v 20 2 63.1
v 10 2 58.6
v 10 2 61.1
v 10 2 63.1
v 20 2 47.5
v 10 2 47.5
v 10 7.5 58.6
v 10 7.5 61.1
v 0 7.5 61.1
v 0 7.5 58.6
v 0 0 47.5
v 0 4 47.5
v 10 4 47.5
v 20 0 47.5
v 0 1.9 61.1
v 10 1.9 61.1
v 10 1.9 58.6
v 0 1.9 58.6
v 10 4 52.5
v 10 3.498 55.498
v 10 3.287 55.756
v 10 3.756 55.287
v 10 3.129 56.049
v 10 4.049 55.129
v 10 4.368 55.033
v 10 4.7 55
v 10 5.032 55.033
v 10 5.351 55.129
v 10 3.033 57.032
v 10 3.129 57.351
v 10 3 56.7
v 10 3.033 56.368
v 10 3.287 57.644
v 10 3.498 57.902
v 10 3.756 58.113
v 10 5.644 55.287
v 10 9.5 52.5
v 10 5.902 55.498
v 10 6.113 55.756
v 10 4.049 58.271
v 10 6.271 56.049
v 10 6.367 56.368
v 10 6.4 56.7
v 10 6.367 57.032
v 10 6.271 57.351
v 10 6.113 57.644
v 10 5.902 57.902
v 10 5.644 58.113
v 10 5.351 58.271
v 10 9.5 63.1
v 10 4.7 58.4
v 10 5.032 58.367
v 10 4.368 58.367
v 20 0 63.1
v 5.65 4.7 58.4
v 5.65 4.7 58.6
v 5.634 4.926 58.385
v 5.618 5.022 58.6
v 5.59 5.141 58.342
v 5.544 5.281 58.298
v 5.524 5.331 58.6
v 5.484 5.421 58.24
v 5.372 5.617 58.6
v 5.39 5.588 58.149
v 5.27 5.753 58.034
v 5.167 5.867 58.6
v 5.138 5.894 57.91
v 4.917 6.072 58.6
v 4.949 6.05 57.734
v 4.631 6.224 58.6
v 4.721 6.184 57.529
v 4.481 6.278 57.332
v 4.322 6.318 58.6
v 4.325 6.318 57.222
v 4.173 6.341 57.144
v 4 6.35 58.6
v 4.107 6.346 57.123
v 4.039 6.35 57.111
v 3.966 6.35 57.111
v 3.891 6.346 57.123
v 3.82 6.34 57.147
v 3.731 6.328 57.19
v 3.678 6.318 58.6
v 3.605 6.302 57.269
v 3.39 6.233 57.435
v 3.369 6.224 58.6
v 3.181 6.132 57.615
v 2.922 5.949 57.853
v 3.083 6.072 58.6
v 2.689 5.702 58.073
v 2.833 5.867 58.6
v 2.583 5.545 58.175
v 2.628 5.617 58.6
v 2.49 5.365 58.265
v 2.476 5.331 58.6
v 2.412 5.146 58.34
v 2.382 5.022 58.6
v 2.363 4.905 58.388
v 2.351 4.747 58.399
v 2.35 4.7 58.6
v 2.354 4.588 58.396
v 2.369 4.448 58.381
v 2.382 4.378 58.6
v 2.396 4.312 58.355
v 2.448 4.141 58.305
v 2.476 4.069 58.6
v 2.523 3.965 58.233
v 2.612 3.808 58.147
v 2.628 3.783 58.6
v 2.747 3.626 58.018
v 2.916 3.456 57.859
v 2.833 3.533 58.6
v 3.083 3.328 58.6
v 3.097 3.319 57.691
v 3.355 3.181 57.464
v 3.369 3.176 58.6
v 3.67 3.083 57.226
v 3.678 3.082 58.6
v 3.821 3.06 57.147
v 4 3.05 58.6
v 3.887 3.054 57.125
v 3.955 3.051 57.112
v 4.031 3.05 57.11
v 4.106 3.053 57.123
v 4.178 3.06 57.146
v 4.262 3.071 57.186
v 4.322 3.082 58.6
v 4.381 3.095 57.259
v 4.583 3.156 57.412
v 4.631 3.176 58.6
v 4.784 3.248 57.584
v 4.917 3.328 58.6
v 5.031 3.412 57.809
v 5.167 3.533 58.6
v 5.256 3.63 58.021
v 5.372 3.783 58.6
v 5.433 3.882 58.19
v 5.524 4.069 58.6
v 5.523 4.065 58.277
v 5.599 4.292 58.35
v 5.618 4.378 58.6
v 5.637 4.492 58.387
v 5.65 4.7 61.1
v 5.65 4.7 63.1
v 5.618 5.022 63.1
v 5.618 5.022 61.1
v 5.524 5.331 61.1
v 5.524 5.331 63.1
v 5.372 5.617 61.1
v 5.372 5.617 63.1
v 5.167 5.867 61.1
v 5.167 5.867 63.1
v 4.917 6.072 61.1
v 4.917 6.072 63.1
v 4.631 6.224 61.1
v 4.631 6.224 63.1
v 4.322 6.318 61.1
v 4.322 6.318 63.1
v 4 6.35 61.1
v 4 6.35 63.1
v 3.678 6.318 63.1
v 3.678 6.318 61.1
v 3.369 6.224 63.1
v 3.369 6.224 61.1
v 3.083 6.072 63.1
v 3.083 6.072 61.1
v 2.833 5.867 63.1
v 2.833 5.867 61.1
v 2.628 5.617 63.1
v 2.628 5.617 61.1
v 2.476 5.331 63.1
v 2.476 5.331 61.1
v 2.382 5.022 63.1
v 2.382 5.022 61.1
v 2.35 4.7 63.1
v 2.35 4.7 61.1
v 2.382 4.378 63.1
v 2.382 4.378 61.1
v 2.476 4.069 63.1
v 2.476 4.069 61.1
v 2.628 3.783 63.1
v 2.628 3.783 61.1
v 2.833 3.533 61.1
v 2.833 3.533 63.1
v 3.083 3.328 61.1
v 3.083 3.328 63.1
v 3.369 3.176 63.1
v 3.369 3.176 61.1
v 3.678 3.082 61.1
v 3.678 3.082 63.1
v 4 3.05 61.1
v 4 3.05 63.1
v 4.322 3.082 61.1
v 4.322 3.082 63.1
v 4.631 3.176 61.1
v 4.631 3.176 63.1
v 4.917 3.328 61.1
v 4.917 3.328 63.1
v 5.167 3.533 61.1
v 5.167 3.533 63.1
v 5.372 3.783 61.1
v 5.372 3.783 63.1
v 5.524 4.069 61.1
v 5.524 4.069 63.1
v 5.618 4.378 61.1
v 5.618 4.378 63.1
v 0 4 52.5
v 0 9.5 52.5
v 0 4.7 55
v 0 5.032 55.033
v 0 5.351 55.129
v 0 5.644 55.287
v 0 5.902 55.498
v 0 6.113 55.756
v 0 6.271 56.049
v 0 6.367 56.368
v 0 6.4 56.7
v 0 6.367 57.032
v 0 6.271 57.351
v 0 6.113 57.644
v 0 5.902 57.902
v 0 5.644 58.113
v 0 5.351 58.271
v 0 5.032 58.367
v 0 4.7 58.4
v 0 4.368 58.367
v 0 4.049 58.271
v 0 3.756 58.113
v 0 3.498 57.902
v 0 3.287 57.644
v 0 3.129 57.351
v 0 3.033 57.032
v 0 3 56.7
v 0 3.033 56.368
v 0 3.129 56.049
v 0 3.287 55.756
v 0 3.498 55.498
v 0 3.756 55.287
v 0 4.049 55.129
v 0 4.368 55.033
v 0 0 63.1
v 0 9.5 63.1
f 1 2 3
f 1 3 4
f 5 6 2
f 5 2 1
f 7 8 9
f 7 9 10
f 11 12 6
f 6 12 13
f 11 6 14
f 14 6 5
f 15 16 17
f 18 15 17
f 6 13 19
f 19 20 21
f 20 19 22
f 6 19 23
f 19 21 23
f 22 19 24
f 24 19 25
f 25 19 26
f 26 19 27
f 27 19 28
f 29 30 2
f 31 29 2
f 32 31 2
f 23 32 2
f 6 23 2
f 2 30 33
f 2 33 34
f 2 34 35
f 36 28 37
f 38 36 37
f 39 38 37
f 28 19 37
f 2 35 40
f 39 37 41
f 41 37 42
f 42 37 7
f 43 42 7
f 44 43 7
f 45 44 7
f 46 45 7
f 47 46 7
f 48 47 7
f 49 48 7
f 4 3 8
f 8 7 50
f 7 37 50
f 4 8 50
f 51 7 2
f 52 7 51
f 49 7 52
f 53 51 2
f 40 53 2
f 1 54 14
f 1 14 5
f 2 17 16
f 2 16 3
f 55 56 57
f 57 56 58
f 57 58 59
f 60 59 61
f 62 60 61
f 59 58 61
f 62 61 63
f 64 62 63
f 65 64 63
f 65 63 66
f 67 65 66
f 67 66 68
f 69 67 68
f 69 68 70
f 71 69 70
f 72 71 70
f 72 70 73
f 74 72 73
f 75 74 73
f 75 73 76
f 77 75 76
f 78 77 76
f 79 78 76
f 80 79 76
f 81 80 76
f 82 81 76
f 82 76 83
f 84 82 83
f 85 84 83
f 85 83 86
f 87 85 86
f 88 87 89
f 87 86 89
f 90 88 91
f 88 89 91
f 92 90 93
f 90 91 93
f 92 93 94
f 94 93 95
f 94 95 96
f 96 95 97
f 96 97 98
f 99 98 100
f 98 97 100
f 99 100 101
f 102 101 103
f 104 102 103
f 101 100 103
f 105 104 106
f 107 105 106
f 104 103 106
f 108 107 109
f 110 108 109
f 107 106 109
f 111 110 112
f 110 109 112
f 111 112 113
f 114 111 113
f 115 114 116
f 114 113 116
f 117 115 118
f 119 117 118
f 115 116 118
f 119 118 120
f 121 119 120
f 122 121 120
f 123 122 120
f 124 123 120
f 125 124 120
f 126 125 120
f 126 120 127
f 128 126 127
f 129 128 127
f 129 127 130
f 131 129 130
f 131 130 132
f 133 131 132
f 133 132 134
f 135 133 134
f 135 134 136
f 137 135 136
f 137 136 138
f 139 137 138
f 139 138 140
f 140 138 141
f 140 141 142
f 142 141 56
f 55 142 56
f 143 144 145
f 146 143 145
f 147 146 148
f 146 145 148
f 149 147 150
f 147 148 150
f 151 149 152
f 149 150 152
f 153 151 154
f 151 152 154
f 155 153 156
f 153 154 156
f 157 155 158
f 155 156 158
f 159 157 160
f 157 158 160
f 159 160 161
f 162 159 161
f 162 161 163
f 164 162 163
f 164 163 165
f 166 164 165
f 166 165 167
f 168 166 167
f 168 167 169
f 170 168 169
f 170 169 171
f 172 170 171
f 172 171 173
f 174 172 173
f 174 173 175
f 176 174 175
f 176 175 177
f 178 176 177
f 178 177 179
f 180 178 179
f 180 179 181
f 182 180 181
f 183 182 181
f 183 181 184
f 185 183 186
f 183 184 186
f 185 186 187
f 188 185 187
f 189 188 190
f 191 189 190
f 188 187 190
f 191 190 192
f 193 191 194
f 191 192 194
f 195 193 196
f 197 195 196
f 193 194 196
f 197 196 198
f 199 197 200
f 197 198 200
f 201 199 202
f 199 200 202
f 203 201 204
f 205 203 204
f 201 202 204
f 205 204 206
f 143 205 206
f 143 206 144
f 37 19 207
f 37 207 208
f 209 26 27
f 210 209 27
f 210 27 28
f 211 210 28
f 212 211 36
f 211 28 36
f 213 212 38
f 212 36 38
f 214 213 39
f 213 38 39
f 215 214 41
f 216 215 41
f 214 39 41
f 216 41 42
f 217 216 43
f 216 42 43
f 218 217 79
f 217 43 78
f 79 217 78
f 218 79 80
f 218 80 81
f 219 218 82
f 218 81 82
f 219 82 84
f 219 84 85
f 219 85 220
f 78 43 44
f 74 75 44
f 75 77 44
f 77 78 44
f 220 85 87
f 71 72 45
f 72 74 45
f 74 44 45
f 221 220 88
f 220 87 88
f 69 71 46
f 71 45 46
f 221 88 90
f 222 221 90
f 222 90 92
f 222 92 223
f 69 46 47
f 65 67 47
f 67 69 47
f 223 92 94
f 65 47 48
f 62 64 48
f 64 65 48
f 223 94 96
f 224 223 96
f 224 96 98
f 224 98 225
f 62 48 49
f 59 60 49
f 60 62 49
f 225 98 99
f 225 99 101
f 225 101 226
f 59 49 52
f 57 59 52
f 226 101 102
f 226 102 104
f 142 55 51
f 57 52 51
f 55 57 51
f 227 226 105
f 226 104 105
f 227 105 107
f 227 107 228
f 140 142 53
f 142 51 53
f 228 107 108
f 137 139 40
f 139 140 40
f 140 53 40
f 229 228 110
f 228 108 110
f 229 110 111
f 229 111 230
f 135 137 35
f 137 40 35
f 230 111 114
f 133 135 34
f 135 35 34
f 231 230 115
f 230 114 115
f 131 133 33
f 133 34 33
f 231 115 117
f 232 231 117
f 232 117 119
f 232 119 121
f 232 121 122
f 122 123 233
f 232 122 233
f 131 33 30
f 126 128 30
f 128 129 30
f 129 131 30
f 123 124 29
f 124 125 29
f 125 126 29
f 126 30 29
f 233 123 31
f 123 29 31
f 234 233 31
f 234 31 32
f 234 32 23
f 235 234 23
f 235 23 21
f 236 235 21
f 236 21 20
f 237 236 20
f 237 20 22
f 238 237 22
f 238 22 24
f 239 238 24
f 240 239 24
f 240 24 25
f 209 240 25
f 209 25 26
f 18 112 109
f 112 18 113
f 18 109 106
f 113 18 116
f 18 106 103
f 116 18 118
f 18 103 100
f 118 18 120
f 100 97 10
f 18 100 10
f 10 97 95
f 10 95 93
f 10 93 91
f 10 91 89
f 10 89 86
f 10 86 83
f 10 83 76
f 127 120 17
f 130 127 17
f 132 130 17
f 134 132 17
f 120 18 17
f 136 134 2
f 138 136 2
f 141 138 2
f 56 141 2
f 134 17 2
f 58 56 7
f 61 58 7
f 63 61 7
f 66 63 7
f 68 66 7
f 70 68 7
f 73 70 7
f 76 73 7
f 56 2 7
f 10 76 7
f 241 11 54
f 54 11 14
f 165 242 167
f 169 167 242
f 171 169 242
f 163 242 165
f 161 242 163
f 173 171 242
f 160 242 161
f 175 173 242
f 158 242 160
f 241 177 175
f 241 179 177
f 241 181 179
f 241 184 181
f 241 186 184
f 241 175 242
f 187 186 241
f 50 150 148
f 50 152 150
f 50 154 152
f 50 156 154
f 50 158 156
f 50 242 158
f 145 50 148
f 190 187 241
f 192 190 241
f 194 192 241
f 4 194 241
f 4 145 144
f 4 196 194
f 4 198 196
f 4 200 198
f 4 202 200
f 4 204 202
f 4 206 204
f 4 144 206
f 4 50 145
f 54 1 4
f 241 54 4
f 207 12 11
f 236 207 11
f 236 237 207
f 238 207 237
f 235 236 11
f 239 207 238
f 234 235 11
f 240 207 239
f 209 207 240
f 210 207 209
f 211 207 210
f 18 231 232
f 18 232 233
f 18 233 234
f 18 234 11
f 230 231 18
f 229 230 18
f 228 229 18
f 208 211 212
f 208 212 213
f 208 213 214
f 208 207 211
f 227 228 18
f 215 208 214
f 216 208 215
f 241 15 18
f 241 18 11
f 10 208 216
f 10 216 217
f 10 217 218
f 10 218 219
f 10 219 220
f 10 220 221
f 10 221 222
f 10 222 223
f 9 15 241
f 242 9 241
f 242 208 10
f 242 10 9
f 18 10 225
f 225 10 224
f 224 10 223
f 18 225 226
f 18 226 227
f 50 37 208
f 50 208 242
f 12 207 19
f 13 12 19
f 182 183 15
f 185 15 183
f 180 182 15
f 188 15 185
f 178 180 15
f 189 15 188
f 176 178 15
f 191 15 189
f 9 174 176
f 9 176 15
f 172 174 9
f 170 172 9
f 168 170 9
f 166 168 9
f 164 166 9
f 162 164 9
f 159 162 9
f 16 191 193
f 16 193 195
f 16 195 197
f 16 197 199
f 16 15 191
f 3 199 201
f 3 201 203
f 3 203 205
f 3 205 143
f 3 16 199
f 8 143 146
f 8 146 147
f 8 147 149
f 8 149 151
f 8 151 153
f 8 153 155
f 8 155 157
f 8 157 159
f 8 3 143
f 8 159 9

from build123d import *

# Parameters (mm, degrees)
RESSALTO_EXTRUS_O1_DEPTH             = 52.5
ESBO_O3_W                            = 10
ESBO_O3_H                            = 4
RESSALTO_EXTRUS_O2_DEPTH             = 5
ESBO_O4_R                            = 1.7
ESBO_O4_W                            = 2.5
ESBO_O4_H                            = 5.6
RESSALTO_EXTRUS_O3_DEPTH             = 10
ESBO_O5_R                            = 1.65
CORTE_EXTRUS_O1_DEPTH                = 6
RESSALTO_EXTRUS_O4_REACH             = 12.6
ESBO_O6_W                            = 10
ESBO_O6_H                            = 2
RESSALTO_EXTRUS_O4_DIRECTION_2_REACH = 117.6
ESBO_O7_W                            = 20
ESBO_O7_H                            = 110.6
CORTE_EXTRUS_O2_DEPTH                = 6.5
CORTE_EXTRUS_O2_DEPTH_BACK           = 5


with BuildPart() as part:
    # Esboço1 → Ressalto-extrusão1 (new body, symmetric)
    with BuildSketch(Plane.XY):
        Polygon((0, 0), (0, 2), (5, 2), (5, 4), (10, 4), (10, 2), (20, 2), (20, 0), align=None)
    extrude(amount=RESSALTO_EXTRUS_O1_DEPTH, both=True)

    # Esboço3 → Ressalto-extrusão2 (add)
    with BuildSketch(Plane.XY.offset(52.5)):
        with Locations((5, 2)):
            Rectangle(ESBO_O3_W, ESBO_O3_H)
    extrude(amount=-RESSALTO_EXTRUS_O2_DEPTH)

    # Esboço4 → Ressalto-extrusão3 (add, through all)
    with BuildSketch(Plane(origin=(10, 0, 0), x_dir=(0, 0, -1), z_dir=(1, 0, 0))):
        Polygon((-52.5, 9.5), (-63.1, 9.5), (-63.1, 0), (-52.5, 0), (-52.5, 3.742943079), align=None)
        with Locations((-56.7, 4.7)):
            Circle(ESBO_O4_R, mode=Mode.SUBTRACT)
        with Locations((-59.85, 4.7)):
            Rectangle(ESBO_O4_W, ESBO_O4_H, mode=Mode.SUBTRACT)
    ressalto_extrus_o3 = extrude(amount=-RESSALTO_EXTRUS_O3_DEPTH)

    # Esboço5 → Corte-extrusão1 (cut)
    with BuildSketch(Plane.XY.offset(63.1)):
        with Locations((4, 4.7)):
            Circle(ESBO_O5_R)
    corte_extrus_o1 = extrude(amount=-CORTE_EXTRUS_O1_DEPTH, mode=Mode.SUBTRACT)

    # Espelhar1: Ressalto-extrusão3, Corte-extrusão1 across plane
    add(ressalto_extrus_o3.mirror(Plane.XY))
    add(corte_extrus_o1.mirror(Plane.XY), mode=Mode.SUBTRACT)

    # Ressalto-extrusão4: up to this face of the body (flat: up to its plane)
    ressalto_extrus_o4_end = Plane(part.part.faces().sort_by_distance((5, 9.362068858, 63.1))[0])
    # Esboço6 → Ressalto-extrusão4 (add, up to the picked face)
    with BuildSketch(Plane.XY.offset(52.5), mode=Mode.PRIVATE) as ressalto_extrus_o4_sk1:
        with Locations((15, 1)):
            Rectangle(ESBO_O6_W, ESBO_O6_H)
    ressalto_extrus_o4_tool1 = split(extrude(ressalto_extrus_o4_sk1.sketch, amount=RESSALTO_EXTRUS_O4_REACH, mode=Mode.PRIVATE), bisect_by=ressalto_extrus_o4_end, keep=Keep.BOTH, mode=Mode.PRIVATE)
    add(ressalto_extrus_o4_tool1.solids().sort_by_distance((15, 1, 52.5))[0])

    # Ressalto-extrusão4 direction 2: up to this face of the body (flat: up to its plane)
    ressalto_extrus_o4_direction_2_end = Plane(part.part.faces().sort_by_distance((5, 9.362068858, -63.1))[0])
    # Esboço6 → Ressalto-extrusão4 direction 2 (add, up to the picked face)
    with BuildSketch(Plane.XY.offset(52.5), mode=Mode.PRIVATE) as ressalto_extrus_o4_direction_2_sk1:
        with Locations((15, 1)):
            Rectangle(ESBO_O6_W, ESBO_O6_H)
    ressalto_extrus_o4_direction_2_tool1 = split(extrude(ressalto_extrus_o4_direction_2_sk1.sketch, amount=-RESSALTO_EXTRUS_O4_DIRECTION_2_REACH, mode=Mode.PRIVATE), bisect_by=ressalto_extrus_o4_direction_2_end, keep=Keep.BOTH, mode=Mode.PRIVATE)
    add(ressalto_extrus_o4_direction_2_tool1.solids().sort_by_distance((15, 1, 52.5))[0])

    # Esboço7 → Corte-extrusão2 (cut, two sides)
    with BuildSketch(Plane(origin=(0, 4, 0), x_dir=(1, 0, 0), z_dir=(0, 1, 0))) as corte_extrus_o2_sk:
        with Locations((10, 7.8)):
            Rectangle(ESBO_O7_W, ESBO_O7_H)
    extrude(amount=CORTE_EXTRUS_O2_DEPTH, mode=Mode.SUBTRACT)
    extrude(corte_extrus_o2_sk.sketch, amount=-CORTE_EXTRUS_O2_DEPTH_BACK, mode=Mode.SUBTRACT)


solid = part.part
